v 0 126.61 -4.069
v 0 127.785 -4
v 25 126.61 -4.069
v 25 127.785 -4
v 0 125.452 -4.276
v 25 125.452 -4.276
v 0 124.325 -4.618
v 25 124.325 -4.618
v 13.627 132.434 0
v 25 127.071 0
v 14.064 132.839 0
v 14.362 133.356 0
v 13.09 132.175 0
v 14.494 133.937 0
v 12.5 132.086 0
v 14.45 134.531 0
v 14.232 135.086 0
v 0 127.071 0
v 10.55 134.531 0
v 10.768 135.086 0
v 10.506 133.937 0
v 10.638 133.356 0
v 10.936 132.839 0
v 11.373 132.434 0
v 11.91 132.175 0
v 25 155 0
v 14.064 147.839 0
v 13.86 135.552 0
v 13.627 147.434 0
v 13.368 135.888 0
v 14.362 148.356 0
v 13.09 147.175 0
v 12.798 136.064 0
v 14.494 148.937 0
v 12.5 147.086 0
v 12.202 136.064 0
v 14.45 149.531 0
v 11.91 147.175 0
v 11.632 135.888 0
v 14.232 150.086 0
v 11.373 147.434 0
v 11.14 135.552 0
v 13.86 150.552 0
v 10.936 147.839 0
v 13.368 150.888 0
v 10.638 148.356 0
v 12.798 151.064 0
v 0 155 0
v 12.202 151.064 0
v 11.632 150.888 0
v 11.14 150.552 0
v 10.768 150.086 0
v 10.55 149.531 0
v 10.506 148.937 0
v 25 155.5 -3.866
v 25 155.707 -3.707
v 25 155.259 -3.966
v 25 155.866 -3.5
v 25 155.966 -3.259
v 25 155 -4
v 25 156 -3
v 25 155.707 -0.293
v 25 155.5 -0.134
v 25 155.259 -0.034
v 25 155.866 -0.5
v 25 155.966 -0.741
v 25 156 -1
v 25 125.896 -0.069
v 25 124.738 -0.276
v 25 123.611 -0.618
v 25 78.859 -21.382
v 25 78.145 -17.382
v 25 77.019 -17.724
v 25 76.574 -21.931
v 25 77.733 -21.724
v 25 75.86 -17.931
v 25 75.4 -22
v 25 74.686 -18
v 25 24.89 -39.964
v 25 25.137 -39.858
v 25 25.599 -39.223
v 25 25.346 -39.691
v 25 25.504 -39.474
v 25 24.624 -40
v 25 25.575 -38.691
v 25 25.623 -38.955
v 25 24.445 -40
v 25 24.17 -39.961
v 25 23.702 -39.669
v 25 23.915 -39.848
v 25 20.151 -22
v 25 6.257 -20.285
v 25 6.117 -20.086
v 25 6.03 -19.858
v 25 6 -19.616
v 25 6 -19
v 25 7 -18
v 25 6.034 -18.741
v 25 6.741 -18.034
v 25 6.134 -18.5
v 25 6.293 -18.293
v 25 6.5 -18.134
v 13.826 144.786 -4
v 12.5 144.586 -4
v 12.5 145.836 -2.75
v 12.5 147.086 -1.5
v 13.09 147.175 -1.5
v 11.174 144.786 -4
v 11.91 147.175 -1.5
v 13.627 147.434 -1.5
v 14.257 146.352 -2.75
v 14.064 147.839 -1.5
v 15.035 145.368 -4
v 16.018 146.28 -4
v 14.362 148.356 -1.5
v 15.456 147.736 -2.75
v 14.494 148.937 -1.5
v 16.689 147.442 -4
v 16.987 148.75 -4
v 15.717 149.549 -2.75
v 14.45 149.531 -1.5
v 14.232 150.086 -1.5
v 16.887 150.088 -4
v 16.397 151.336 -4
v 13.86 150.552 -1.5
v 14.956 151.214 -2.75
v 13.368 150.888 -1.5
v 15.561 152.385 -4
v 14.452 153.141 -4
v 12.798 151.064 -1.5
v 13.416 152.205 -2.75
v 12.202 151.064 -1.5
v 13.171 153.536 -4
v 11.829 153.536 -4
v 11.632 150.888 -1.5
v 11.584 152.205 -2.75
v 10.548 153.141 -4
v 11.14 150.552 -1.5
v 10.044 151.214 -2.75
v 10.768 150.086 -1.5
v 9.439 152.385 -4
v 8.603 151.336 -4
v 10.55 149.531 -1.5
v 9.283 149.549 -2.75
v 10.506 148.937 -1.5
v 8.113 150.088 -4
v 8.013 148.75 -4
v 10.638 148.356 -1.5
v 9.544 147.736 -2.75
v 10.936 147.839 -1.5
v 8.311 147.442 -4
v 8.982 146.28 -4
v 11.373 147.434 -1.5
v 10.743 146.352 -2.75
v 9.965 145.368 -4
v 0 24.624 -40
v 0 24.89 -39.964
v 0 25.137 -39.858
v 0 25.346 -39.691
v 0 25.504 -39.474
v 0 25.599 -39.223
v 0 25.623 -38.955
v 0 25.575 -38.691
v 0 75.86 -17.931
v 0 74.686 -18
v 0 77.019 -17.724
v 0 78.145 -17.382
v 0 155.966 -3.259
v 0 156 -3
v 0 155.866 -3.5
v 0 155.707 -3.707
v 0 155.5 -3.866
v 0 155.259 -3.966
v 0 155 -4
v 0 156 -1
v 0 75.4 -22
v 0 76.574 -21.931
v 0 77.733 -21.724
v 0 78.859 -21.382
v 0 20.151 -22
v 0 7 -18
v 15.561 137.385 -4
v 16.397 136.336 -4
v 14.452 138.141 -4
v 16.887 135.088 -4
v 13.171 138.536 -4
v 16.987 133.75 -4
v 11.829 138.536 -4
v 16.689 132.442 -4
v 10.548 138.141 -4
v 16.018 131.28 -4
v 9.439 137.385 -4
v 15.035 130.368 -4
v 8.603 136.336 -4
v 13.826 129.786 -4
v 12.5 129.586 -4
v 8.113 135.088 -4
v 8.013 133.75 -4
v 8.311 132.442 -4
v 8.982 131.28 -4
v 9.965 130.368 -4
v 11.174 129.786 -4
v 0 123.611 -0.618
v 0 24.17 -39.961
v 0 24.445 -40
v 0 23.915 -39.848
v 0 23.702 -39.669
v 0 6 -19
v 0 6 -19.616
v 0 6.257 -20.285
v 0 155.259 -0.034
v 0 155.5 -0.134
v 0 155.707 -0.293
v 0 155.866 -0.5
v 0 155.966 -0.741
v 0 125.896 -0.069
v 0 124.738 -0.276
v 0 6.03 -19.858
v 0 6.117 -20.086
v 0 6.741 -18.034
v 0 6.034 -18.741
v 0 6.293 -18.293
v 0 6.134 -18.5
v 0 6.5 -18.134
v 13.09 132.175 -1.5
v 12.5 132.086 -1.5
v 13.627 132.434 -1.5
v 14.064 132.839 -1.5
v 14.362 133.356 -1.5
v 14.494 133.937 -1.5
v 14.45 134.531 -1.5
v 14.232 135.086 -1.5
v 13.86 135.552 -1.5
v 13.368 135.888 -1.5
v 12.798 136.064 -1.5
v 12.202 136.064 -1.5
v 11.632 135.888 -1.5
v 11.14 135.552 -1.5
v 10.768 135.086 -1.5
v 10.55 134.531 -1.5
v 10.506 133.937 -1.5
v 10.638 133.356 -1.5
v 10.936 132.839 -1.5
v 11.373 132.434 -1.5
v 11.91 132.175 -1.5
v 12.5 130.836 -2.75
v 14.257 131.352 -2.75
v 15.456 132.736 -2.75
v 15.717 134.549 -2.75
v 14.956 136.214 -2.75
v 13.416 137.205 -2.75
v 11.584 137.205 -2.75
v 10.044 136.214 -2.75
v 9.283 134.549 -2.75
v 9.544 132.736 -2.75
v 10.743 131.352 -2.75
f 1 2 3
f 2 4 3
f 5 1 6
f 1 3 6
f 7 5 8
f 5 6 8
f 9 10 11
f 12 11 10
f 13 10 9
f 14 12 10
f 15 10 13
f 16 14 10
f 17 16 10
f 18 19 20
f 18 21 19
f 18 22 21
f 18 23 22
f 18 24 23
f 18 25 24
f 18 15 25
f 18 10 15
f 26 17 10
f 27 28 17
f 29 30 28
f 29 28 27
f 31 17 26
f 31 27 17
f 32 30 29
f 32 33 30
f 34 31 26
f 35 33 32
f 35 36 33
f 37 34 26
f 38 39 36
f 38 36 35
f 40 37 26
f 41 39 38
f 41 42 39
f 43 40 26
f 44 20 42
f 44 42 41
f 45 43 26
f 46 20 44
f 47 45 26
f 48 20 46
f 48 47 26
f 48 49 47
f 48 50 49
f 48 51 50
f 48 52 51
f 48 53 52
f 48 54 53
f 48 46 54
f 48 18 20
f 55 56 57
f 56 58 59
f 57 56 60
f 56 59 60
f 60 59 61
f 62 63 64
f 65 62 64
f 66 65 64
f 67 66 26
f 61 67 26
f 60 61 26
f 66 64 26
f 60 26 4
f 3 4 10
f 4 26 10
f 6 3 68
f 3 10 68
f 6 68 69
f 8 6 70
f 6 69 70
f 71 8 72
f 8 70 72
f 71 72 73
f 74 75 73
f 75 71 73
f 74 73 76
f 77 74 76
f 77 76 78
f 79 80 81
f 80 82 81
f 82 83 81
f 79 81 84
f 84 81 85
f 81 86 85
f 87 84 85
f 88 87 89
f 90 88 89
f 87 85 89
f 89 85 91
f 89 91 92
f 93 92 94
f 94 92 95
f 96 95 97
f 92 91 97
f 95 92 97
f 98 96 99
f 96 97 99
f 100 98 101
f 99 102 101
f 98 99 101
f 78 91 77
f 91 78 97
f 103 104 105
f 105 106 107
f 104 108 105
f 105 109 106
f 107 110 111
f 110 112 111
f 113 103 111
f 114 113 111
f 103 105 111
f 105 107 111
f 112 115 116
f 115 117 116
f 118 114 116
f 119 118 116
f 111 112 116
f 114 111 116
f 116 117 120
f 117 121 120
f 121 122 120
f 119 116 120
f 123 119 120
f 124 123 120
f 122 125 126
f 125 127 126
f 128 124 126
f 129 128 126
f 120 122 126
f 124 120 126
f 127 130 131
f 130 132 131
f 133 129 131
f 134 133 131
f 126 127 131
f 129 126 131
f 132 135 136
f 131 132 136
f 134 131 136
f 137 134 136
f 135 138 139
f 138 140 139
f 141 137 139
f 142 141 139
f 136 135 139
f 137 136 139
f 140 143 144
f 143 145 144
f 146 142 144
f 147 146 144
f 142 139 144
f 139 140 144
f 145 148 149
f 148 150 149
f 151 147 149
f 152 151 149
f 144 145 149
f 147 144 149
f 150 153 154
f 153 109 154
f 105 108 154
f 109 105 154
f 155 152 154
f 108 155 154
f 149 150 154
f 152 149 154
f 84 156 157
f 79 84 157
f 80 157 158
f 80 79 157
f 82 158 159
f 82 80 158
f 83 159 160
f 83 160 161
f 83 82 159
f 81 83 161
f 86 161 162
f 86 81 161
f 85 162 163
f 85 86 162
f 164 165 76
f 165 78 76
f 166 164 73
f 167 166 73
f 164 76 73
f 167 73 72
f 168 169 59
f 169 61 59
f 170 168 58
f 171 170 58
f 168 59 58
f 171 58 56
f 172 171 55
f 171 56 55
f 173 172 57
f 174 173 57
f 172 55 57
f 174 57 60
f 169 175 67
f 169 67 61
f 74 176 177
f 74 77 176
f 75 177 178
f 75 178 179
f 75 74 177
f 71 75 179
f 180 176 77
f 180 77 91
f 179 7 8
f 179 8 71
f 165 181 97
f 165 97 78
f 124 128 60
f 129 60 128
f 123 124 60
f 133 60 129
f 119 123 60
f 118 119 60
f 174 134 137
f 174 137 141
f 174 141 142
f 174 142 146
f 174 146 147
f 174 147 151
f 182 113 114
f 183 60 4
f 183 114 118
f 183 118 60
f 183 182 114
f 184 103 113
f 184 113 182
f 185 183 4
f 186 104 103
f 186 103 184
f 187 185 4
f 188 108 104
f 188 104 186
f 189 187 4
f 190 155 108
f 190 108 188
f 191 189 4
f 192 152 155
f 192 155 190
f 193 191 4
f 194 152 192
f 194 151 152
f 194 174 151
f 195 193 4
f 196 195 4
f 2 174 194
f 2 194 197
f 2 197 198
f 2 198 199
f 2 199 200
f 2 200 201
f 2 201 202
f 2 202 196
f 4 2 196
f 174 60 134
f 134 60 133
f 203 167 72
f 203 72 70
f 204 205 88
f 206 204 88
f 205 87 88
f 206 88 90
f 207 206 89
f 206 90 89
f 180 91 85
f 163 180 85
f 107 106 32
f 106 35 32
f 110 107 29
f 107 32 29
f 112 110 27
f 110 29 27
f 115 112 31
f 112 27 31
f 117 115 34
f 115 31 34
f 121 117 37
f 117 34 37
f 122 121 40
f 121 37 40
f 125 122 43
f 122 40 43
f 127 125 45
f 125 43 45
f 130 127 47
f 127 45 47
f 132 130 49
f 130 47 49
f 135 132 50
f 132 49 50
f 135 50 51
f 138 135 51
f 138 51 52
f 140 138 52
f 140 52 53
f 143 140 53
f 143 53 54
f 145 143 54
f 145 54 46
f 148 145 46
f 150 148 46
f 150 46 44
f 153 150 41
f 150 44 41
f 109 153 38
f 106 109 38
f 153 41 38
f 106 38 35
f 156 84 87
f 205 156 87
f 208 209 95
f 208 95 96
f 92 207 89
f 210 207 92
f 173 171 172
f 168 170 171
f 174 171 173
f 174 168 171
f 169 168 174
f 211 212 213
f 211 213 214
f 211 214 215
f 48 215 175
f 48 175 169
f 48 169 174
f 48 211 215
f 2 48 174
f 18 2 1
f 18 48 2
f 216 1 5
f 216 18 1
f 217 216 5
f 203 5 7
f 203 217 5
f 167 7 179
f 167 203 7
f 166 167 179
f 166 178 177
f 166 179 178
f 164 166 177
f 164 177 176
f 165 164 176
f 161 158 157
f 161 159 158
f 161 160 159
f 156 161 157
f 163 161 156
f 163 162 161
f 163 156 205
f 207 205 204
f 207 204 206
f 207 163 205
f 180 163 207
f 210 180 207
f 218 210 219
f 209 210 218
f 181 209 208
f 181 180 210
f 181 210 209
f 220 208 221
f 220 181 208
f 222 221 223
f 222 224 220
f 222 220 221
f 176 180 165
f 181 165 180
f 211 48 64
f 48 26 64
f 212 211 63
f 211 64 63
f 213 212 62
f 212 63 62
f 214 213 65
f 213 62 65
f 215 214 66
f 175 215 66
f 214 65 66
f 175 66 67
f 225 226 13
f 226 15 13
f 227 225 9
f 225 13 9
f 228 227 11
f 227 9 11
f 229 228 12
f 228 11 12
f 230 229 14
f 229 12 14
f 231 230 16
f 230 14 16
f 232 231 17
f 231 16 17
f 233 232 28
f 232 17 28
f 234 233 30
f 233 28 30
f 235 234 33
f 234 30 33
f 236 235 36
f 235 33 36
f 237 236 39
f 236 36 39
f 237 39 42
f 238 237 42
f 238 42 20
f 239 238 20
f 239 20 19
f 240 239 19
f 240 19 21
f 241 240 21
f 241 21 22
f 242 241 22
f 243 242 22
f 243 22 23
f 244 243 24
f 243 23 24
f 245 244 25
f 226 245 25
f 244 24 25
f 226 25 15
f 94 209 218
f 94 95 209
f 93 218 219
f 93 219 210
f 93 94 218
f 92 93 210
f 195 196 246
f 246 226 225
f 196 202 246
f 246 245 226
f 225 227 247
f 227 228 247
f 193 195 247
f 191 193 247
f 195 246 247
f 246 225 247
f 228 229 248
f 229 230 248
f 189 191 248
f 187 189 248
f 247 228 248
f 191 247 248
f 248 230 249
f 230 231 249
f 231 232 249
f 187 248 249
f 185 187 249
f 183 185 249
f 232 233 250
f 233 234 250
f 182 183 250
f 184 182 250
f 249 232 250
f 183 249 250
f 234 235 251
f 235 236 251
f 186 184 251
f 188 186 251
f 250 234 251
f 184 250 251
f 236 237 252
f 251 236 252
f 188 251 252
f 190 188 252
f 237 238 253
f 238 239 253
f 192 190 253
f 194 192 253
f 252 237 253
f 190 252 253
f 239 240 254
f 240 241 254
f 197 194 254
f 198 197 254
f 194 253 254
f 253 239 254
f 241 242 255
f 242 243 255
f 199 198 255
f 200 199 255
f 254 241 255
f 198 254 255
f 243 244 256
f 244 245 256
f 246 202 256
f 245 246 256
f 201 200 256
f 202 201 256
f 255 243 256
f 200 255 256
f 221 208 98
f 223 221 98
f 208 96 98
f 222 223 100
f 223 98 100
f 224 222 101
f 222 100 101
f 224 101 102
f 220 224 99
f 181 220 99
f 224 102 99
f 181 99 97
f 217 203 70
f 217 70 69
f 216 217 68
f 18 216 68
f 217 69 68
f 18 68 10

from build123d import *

# Parameters (mm, degrees)
PAD_DEPTH        = 25
HOLE_D           = 4
HOLE_DEPTH       = 25
HOLE_CSINK_D     = 9
HOLE_CSINK_ANGLE = 90
FILLET_R         = 1
FILLET001_R      = 10
FILLET002_R      = 1


with BuildPart() as part:
    # Sketch001 → Pad (new body)
    with BuildSketch(Plane.YZ):
        Polygon((6, -20), (6, -18), (76.470527, -18), (125.286025, 0), (156, 0), (156, -4), (126, -4), (77.184502, -22), (20.151445, -22), (26, -40), (24, -40), align=None)
    extrude(amount=PAD_DEPTH)

    # Hole
    with Locations(Plane.YX.offset(4)):
        with Locations((134.08619, 12.5), (149.08619, 12.5)):
            CounterSinkHole(HOLE_D / 2, HOLE_CSINK_D / 2, depth=HOLE_DEPTH, counter_sink_angle=HOLE_CSINK_ANGLE)

    # Fillet
    fillet_edges = [part.edges().sort_by_distance(p)[0] for p in [
        (12.5, 6, -18),
        (12.5, 6, -20),
        (12.5, 24, -40),
        (12.5, 26, -40),
    ]]
    fillet(fillet_edges, radius=FILLET_R)

    # Fillet001
    fillet001_edges = [part.edges().sort_by_distance(p)[0] for p in [
        (12.5, 76.470527, -18),
        (12.5, 125.286025, 0),
        (12.5, 77.184502, -22),
        (12.5, 126, -4),
    ]]
    fillet(fillet001_edges, radius=FILLET001_R)

    # Fillet002
    fillet002_edges = [part.edges().sort_by_distance(p)[0] for p in [
        (12.5, 156, -4),
        (12.5, 156, 0),
    ]]
    fillet(fillet002_edges, radius=FILLET002_R)


solid = part.part
